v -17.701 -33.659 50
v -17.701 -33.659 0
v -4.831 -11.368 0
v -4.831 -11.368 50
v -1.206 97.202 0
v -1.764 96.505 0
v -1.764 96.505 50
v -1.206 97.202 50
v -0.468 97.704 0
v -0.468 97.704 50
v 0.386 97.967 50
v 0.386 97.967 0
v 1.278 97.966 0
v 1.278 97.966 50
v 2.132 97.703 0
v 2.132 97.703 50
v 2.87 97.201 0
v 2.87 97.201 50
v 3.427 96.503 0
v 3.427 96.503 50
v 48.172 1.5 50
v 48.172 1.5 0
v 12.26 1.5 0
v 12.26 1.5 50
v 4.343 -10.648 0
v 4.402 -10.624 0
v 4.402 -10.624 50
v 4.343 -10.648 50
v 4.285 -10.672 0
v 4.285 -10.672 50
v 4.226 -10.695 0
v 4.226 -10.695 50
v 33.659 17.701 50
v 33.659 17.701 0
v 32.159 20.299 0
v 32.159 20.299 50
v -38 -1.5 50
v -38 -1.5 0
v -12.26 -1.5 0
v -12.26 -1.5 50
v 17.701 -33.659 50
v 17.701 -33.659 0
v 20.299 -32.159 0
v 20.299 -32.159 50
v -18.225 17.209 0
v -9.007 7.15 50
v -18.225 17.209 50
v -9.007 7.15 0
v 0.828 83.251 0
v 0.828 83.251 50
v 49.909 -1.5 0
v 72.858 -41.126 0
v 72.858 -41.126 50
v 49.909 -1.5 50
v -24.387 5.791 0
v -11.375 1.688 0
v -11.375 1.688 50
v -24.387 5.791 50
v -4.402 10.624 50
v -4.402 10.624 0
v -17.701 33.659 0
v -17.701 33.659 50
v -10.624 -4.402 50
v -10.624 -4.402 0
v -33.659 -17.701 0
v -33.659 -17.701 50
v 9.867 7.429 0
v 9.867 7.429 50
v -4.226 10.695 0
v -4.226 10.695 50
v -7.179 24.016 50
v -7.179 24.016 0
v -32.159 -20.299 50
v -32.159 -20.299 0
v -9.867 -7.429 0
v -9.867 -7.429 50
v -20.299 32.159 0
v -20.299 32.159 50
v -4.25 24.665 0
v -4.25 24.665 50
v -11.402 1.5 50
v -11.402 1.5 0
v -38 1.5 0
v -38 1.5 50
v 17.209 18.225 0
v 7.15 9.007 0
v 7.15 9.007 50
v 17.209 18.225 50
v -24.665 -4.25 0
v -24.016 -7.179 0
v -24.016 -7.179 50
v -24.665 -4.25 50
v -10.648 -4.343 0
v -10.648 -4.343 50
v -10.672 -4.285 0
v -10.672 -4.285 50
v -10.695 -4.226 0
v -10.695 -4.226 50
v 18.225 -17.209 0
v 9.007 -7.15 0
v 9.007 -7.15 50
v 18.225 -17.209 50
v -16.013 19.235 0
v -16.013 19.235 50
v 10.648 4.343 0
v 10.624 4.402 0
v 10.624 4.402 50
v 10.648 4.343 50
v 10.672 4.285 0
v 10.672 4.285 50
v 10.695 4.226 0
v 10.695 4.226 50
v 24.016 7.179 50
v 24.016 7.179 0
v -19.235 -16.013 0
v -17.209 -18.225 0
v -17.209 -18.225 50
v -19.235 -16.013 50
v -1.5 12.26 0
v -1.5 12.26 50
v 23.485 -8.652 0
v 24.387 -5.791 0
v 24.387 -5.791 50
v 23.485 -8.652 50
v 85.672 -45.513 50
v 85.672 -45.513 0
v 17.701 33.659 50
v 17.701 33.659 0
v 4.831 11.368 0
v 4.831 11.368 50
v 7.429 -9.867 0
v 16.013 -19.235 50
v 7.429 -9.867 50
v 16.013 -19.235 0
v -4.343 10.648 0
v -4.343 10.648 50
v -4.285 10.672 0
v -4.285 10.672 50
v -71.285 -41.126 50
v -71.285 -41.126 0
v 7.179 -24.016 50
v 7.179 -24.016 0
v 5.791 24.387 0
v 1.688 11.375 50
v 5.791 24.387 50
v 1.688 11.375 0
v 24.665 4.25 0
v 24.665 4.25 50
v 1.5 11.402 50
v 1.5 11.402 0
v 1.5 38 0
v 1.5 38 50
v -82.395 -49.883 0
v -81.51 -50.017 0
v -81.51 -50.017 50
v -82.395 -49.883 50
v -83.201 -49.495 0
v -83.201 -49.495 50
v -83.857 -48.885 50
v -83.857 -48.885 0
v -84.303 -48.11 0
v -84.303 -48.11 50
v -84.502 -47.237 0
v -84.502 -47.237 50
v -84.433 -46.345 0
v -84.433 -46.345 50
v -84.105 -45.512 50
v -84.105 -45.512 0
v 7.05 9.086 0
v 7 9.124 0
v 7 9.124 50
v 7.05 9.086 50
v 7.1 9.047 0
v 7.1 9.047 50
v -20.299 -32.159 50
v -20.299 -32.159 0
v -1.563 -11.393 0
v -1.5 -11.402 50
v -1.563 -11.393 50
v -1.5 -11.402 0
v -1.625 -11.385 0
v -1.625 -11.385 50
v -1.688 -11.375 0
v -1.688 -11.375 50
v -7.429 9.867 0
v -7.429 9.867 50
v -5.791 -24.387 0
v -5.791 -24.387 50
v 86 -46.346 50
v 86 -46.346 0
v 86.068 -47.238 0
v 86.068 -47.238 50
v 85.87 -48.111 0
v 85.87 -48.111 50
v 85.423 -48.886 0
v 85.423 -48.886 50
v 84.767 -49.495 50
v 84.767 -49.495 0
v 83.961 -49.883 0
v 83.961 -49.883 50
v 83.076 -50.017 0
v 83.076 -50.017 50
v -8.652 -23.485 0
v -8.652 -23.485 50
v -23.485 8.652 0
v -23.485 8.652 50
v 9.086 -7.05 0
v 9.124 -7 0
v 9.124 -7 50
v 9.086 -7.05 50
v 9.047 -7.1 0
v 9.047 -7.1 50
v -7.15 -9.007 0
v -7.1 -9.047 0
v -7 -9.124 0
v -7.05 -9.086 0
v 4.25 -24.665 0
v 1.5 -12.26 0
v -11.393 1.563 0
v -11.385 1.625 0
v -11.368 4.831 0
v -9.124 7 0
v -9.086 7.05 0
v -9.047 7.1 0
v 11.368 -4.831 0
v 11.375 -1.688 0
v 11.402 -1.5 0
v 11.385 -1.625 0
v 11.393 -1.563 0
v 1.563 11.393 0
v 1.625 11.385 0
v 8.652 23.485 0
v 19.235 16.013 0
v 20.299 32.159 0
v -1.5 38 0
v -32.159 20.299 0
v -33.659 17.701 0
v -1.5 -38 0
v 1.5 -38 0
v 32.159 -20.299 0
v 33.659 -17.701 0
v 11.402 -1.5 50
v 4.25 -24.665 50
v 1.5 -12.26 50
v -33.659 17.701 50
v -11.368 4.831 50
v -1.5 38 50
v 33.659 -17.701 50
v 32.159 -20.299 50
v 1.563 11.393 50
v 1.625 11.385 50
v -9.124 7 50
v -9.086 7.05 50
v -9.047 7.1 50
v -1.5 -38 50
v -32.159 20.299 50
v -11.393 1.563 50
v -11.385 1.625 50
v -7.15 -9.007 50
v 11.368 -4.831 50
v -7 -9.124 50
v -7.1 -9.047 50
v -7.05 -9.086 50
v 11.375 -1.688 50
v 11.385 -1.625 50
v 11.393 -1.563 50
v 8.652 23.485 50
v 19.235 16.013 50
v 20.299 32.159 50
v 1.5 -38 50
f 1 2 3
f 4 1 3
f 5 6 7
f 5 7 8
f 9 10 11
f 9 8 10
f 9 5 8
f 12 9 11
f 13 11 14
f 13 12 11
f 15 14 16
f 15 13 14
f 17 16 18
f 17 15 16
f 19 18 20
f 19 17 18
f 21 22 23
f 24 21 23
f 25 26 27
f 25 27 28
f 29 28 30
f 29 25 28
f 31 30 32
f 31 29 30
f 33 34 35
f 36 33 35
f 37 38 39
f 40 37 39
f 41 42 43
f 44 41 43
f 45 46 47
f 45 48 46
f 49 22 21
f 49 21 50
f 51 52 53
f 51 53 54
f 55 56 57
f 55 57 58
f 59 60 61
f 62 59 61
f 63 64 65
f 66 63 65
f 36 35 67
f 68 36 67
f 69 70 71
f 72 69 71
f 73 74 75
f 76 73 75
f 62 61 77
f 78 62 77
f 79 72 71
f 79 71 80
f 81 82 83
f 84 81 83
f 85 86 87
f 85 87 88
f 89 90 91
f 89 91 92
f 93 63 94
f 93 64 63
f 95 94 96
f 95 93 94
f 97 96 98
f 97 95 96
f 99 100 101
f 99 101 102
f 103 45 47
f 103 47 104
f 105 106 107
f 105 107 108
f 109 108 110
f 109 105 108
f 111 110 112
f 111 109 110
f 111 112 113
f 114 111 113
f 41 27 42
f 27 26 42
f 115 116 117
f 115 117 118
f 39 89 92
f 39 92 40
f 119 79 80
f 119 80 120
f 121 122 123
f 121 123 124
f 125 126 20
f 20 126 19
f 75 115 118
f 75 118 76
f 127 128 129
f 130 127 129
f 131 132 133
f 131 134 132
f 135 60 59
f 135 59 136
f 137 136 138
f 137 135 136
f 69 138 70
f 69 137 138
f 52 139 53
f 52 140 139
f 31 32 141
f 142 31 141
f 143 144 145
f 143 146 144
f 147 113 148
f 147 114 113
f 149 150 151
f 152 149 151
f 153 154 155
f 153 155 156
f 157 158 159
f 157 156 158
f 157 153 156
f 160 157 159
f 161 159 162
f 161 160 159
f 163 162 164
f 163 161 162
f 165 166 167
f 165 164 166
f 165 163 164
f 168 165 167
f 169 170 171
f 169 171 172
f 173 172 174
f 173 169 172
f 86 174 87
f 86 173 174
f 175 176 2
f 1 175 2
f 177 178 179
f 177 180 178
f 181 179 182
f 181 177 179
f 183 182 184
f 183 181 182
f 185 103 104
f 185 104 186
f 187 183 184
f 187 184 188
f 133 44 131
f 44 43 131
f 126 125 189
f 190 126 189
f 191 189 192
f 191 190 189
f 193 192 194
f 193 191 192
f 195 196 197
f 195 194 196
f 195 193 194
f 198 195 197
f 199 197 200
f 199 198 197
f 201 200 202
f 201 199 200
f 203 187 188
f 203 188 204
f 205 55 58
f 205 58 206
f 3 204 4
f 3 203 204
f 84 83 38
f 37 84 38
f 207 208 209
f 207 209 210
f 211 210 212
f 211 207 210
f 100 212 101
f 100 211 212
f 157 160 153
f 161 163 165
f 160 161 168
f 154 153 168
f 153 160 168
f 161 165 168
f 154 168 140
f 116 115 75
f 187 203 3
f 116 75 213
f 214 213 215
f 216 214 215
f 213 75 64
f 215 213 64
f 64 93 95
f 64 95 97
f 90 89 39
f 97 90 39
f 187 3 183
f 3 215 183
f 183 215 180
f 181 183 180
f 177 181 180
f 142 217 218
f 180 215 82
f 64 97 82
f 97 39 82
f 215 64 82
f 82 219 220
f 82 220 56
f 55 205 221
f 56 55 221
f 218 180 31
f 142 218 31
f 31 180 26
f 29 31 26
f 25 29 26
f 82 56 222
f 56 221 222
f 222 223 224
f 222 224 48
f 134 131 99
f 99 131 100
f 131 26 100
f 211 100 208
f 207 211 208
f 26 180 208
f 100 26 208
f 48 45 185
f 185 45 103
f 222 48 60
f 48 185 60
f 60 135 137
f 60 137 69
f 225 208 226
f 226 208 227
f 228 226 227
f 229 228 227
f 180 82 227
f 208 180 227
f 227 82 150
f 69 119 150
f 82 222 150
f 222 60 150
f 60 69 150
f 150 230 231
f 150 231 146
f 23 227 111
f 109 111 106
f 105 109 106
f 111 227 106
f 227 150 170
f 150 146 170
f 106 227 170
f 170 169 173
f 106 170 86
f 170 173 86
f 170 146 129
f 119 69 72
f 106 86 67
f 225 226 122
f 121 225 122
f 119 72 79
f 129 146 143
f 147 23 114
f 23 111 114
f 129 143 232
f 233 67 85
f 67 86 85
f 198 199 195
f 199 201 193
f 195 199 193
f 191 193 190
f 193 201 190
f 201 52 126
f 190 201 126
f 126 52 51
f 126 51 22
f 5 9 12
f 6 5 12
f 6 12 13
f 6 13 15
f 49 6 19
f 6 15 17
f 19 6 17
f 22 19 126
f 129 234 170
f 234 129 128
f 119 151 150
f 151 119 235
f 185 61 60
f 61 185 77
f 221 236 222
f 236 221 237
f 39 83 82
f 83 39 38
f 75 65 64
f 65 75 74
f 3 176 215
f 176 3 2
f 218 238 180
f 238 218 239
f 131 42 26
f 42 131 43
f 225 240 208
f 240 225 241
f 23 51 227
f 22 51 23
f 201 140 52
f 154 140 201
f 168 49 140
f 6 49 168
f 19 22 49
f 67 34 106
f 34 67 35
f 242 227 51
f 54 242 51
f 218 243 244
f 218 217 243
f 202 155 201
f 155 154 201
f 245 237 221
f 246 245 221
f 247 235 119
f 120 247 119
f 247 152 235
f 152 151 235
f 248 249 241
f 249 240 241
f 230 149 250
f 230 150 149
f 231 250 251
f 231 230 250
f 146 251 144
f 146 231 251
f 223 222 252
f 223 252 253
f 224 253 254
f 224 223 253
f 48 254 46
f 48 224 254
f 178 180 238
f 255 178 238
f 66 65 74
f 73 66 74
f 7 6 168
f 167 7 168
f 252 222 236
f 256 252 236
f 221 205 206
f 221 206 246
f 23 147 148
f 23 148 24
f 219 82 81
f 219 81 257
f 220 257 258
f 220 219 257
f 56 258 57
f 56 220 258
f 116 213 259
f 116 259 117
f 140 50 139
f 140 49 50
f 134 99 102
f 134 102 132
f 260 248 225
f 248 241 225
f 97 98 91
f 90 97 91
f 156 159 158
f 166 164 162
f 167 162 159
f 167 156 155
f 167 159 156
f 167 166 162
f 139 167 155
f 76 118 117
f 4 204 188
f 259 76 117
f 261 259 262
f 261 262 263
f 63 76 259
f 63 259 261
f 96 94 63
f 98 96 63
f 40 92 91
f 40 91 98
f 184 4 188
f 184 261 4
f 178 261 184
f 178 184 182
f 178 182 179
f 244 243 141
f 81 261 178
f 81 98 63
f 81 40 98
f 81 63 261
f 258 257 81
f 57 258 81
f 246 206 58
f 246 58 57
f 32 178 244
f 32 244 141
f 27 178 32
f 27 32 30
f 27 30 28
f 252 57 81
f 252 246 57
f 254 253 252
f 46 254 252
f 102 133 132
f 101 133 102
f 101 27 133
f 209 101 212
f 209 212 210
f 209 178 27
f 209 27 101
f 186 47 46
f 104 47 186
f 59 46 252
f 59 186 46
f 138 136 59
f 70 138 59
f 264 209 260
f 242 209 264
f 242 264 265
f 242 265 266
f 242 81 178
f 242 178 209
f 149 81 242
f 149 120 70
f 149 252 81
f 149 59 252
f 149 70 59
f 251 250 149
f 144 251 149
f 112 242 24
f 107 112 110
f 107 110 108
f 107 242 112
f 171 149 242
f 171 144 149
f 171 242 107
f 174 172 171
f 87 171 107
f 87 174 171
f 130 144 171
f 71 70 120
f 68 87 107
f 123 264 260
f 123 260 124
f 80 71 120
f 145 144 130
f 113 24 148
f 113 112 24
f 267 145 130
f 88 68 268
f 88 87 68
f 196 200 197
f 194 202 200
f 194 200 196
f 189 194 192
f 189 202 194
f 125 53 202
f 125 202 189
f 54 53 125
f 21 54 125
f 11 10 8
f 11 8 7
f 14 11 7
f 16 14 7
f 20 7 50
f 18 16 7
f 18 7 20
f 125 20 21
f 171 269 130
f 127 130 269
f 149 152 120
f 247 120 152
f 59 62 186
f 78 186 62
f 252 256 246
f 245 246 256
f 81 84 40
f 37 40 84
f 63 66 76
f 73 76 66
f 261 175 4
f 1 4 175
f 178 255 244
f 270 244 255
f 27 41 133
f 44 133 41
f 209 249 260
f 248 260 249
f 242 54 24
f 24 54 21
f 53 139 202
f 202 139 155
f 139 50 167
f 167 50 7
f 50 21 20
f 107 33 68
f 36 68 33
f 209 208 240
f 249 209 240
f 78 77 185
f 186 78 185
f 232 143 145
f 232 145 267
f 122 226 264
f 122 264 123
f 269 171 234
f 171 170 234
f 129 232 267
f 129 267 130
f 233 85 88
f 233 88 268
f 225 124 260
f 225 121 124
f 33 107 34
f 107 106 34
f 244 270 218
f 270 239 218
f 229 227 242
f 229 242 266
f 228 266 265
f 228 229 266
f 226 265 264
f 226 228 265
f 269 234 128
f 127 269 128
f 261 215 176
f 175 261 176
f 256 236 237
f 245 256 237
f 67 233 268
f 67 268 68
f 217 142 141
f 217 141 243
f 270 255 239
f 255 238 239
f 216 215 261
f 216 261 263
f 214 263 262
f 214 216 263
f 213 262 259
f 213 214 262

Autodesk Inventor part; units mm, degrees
ref_plane "YZ Plane" through (0, 0, 0) normal (1, 0, 0) x (0, 1, 0)
ref_plane "XZ Plane" through (0, 0, 0) normal (0, 1, 0) x (-1, 0, 0)
ref_plane "XY Plane" through (0, 0, 0) normal (0, 0, 1) x (1, 0, 0)
sketch "Esquisse3" plane through (0, 0, 0) normal (0, 0, 1) x (1, 0, 0)
  line L0 (-97.75, 106.7859) -> (105.7088, 106.7859) construction
  line L1 (105.7088, 106.7859) -> (105.7088, -86.5) construction
  line L2 (105.7088, -86.5) -> (-97.75, -86.5) construction
  line L3 (-97.75, -86.5) -> (-97.75, 106.7859) construction
  circle A0 centre (0, 0) radius 11.5
  line L4 (-1.5, 0) -> (1.5, 0)
  line L5 (1.5, 0) -> (1.5, 38)
  line L6 (1.5, 38) -> (-1.5, 38)
  line L7 (-1.5, 38) -> (-1.5, 0)
  circle A1 centre (0, 0) radius 11.5 construction
  line L8 (-1.299, -0.75) -> (1.299, 0.75)
  line L9 (1.299, 0.75) -> (-17.701, 33.659)
  line L10 (-17.701, 33.659) -> (-20.299, 32.159)
  line L11 (-20.299, 32.159) -> (-1.299, -0.75)
  circle A2 centre (0, 0) radius 11.5 construction
  line L12 (-0.75, -1.299) -> (0.75, 1.299)
  line L13 (0.75, 1.299) -> (-32.159, 20.299)
  line L14 (-32.159, 20.299) -> (-33.659, 17.701)
  line L15 (-33.659, 17.701) -> (-0.75, -1.299)
  circle A3 centre (0, 0) radius 11.5 construction
  line L16 (0, -1.5) -> (0, 1.5)
  line L17 (0, 1.5) -> (-38, 1.5)
  line L18 (-38, 1.5) -> (-38, -1.5)
  line L19 (-38, -1.5) -> (0, -1.5)
  line L20 (-17.701, -33.659) -> (1.299, -0.75)
  line L21 (-0.75, -1.299) -> (0.75, 1.299)
  line L22 (-1.299, 0.75) -> (-20.299, -32.159)
  line L23 (-33.659, -17.701) -> (-32.159, -20.299)
  line L24 (-0.75, 1.299) -> (-33.659, -17.701)
  line L25 (-38, 1.5) -> (-38, -1.5)
  line L26 (0, 1.5) -> (-38, 1.5)
  line L27 (-33.659, 17.701) -> (-0.75, -1.299)
  line L28 (0.75, 1.299) -> (-32.159, 20.299)
  line L29 (-32.159, 20.299) -> (-33.659, 17.701)
  line L30 (-20.299, -32.159) -> (-17.701, -33.659)
  line L31 (-38, -1.5) -> (0, -1.5)
  line L32 (-32.159, -20.299) -> (0.75, -1.299)
  line L33 (1.299, -0.75) -> (-1.299, 0.75)
  line L34 (0.75, -1.299) -> (-0.75, 1.299)
  line L35 (0, -1.5) -> (0, 1.5)
  line L36 (20.299, -32.159) -> (1.299, 0.75)
  line L37 (0.75, -1.299) -> (-0.75, 1.299)
  line L38 (-1.299, -0.75) -> (17.701, -33.659)
  line L39 (-1.5, -38) -> (1.5, -38)
  line L40 (-1.5, 0) -> (-1.5, -38)
  line L41 (-20.299, -32.159) -> (-17.701, -33.659)
  line L42 (-1.299, 0.75) -> (-20.299, -32.159)
  line L43 (-32.159, -20.299) -> (0.75, -1.299)
  line L44 (-0.75, 1.299) -> (-33.659, -17.701)
  line L45 (-33.659, -17.701) -> (-32.159, -20.299)
  line L46 (17.701, -33.659) -> (20.299, -32.159)
  line L47 (-17.701, -33.659) -> (1.299, -0.75)
  line L48 (1.5, -38) -> (1.5, 0)
  line L49 (1.299, 0.75) -> (-1.299, -0.75)
  line L50 (1.5, 0) -> (-1.5, 0)
  line L51 (1.299, -0.75) -> (-1.299, 0.75)
  line L52 (38, 1.5) -> (0, 1.5)
  line L53 (1.5, 0) -> (-1.5, 0)
  line L54 (0, -1.5) -> (38, -1.5)
  line L55 (32.159, -20.299) -> (33.659, -17.701)
  line L56 (-0.75, -1.299) -> (32.159, -20.299)
  line L57 (17.701, -33.659) -> (20.299, -32.159)
  line L58 (-1.299, -0.75) -> (17.701, -33.659)
  line L59 (1.5, -38) -> (1.5, 0)
  line L60 (-1.5, 0) -> (-1.5, -38)
  line L61 (-1.5, -38) -> (1.5, -38)
  line L62 (38, -1.5) -> (38, 1.5)
  line L63 (20.299, -32.159) -> (1.299, 0.75)
  line L64 (33.659, -17.701) -> (0.75, 1.299)
  line L65 (0, 1.5) -> (0, -1.5)
  line L66 (0.75, 1.299) -> (-0.75, -1.299)
  line L67 (1.299, 0.75) -> (-1.299, -0.75)
  line L68 (17.701, 33.659) -> (-1.299, 0.75)
  line L69 (0.75, 1.299) -> (-0.75, -1.299)
  line L70 (1.299, -0.75) -> (20.299, 32.159)
  line L71 (33.659, 17.701) -> (32.159, 20.299)
  line L72 (0.75, -1.299) -> (33.659, 17.701)
  line L73 (38, -1.5) -> (38, 1.5)
  line L74 (0, -1.5) -> (38, -1.5)
  line L75 (33.659, -17.701) -> (0.75, 1.299)
  line L76 (-0.75, -1.299) -> (32.159, -20.299)
  line L77 (32.159, -20.299) -> (33.659, -17.701)
  line L78 (20.299, 32.159) -> (17.701, 33.659)
  line L79 (38, 1.5) -> (0, 1.5)
  line L80 (32.159, 20.299) -> (-0.75, 1.299)
  line L81 (-1.299, 0.75) -> (1.299, -0.75)
  line L82 (-0.75, 1.299) -> (0.75, -1.299)
  line L83 (0, 1.5) -> (0, -1.5)
  line L84 (-20.299, 32.159) -> (-1.299, -0.75)
  line L85 (-0.75, 1.299) -> (0.75, -1.299)
  line L86 (1.299, 0.75) -> (-17.701, 33.659)
  line L87 (1.5, 38) -> (-1.5, 38)
  line L88 (1.5, 0) -> (1.5, 38)
  line L89 (20.299, 32.159) -> (17.701, 33.659)
  line L90 (1.299, -0.75) -> (20.299, 32.159)
  line L91 (32.159, 20.299) -> (-0.75, 1.299)
  line L92 (0.75, -1.299) -> (33.659, 17.701)
  line L93 (33.659, 17.701) -> (32.159, 20.299)
  line L94 (-17.701, 33.659) -> (-20.299, 32.159)
  line L95 (17.701, 33.659) -> (-1.299, 0.75)
  line L96 (-1.5, 38) -> (-1.5, 0)
  line L97 (-1.299, -0.75) -> (1.299, 0.75)
  line L98 (-1.5, 0) -> (1.5, 0)
  line L99 (-1.299, 0.75) -> (1.299, -0.75)
  line L100 (-3.6093, 7.914) -> (-7.1789, 24.0155)
  line L101 (-7.1789, 24.0155) -> (-4.25, 24.6648)
  line L102 (-4.25, 24.6648) -> (-0.6804, 8.5633)
  line L103 (-0.6804, 8.5633) -> (-3.6093, 7.914)
  line L104 (-3.6093, 7.914) -> (-4.25, 24.6648) construction
  line L105 (-7.1789, 24.0155) -> (-0.6804, 8.5633) construction
  line L106 (-4.8709, 7.0758) -> (-7.0827, 5.0491)
  line L107 (-16.013, 19.2353) -> (-4.8709, 7.0758)
  line L108 (-7.0827, 5.0491) -> (-18.2248, 17.2086)
  line L109 (-7.7562, 3.6924) -> (-8.6583, 0.8313)
  line L110 (-23.4853, 8.6518) -> (-7.7562, 3.6924)
  line L111 (-8.6583, 0.8313) -> (-24.3874, 5.7906)
  line L112 (-8.5633, -0.6804) -> (-7.914, -3.6093)
  line L113 (-24.6648, -4.25) -> (-8.5633, -0.6804)
  line L114 (-7.914, -3.6093) -> (-24.0155, -7.1789)
  line L115 (-18.2248, 17.2086) -> (-16.013, 19.2353)
  line L116 (-24.3874, 5.7906) -> (-23.4853, 8.6518)
  line L117 (-24.0155, -7.1789) -> (-24.6648, -4.25)
  line L118 (-0.8313, -8.6583) -> (-5.7906, -24.3874)
  line L119 (-8.6518, -23.4853) -> (-3.6924, -7.7562)
  line L120 (-5.7906, -24.3874) -> (-8.6518, -23.4853)
  line L121 (-3.6924, -7.7562) -> (-0.8313, -8.6583)
  line L122 (-17.2086, -18.2248) -> (-19.2353, -16.013)
  line L123 (-5.0491, -7.0827) -> (-17.2086, -18.2248)
  line L124 (-19.2353, -16.013) -> (-7.0758, -4.8709)
  line L125 (-7.914, -3.6093) -> (-24.0155, -7.1789)
  line L126 (-24.0155, -7.1789) -> (-24.6648, -4.25)
  line L127 (-24.6648, -4.25) -> (-8.5633, -0.6804)
  line L128 (-7.0758, -4.8709) -> (-5.0491, -7.0827)
  line L129 (-7.7562, 3.6924) -> (-8.6583, 0.8313)
  line L130 (-8.6583, 0.8313) -> (-24.3874, 5.7906)
  line L131 (-23.4853, 8.6518) -> (-7.7562, 3.6924)
  line L132 (-8.5633, -0.6804) -> (-7.914, -3.6093)
  line L133 (-24.3874, 5.7906) -> (-23.4853, 8.6518)
  line L134 (7.0827, -5.0491) -> (18.2248, -17.2086)
  line L135 (16.013, -19.2353) -> (4.8709, -7.0758)
  line L136 (18.2248, -17.2086) -> (16.013, -19.2353)
  line L137 (4.8709, -7.0758) -> (7.0827, -5.0491)
  line L138 (7.1789, -24.0155) -> (4.25, -24.6648)
  line L139 (3.6093, -7.914) -> (7.1789, -24.0155)
  line L140 (4.25, -24.6648) -> (0.6804, -8.5633)
  line L141 (-0.8313, -8.6583) -> (-5.7906, -24.3874)
  line L142 (-5.7906, -24.3874) -> (-8.6518, -23.4853)
  line L143 (-8.6518, -23.4853) -> (-3.6924, -7.7562)
  line L144 (0.6804, -8.5633) -> (3.6093, -7.914)
  line L145 (-7.0758, -4.8709) -> (-5.0491, -7.0827)
  line L146 (-5.0491, -7.0827) -> (-17.2086, -18.2248)
  line L147 (-19.2353, -16.013) -> (-7.0758, -4.8709)
  line L148 (-3.6924, -7.7562) -> (-0.8313, -8.6583)
  line L149 (-17.2086, -18.2248) -> (-19.2353, -16.013)
  line L150 (7.914, 3.6093) -> (24.0155, 7.1789)
  line L151 (24.6648, 4.25) -> (8.5633, 0.6804)
  line L152 (24.0155, 7.1789) -> (24.6648, 4.25)
  line L153 (8.5633, 0.6804) -> (7.914, 3.6093)
  line L154 (24.3874, -5.7906) -> (23.4853, -8.6518)
  line L155 (8.6583, -0.8313) -> (24.3874, -5.7906)
  line L156 (23.4853, -8.6518) -> (7.7562, -3.6924)
  line L157 (7.0827, -5.0491) -> (18.2248, -17.2086)
  line L158 (18.2248, -17.2086) -> (16.013, -19.2353)
  line L159 (16.013, -19.2353) -> (4.8709, -7.0758)
  line L160 (7.7562, -3.6924) -> (8.6583, -0.8313)
  line L161 (0.6804, -8.5633) -> (3.6093, -7.914)
  line L162 (3.6093, -7.914) -> (7.1789, -24.0155)
  line L163 (4.25, -24.6648) -> (0.6804, -8.5633)
  line L164 (4.8709, -7.0758) -> (7.0827, -5.0491)
  line L165 (7.1789, -24.0155) -> (4.25, -24.6648)
  line L166 (0.8313, 8.6583) -> (5.7906, 24.3874)
  line L167 (8.6518, 23.4853) -> (3.6924, 7.7562)
  line L168 (5.7906, 24.3874) -> (8.6518, 23.4853)
  line L169 (3.6924, 7.7562) -> (0.8313, 8.6583)
  line L170 (17.2086, 18.2248) -> (19.2353, 16.013)
  line L171 (5.0491, 7.0827) -> (17.2086, 18.2248)
  line L172 (19.2353, 16.013) -> (7.0758, 4.8709)
  line L173 (7.914, 3.6093) -> (24.0155, 7.1789)
  line L174 (24.0155, 7.1789) -> (24.6648, 4.25)
  line L175 (24.6648, 4.25) -> (8.5633, 0.6804)
  line L176 (7.0758, 4.8709) -> (5.0491, 7.0827)
  line L177 (7.7562, -3.6924) -> (8.6583, -0.8313)
  line L178 (8.6583, -0.8313) -> (24.3874, -5.7906)
  line L179 (23.4853, -8.6518) -> (7.7562, -3.6924)
  line L180 (8.5633, 0.6804) -> (7.914, 3.6093)
  line L181 (24.3874, -5.7906) -> (23.4853, -8.6518)
  line L182 (-7.0827, 5.0491) -> (-18.2248, 17.2086)
  line L183 (-16.013, 19.2353) -> (-4.8709, 7.0758)
  line L184 (-18.2248, 17.2086) -> (-16.013, 19.2353)
  line L185 (-4.8709, 7.0758) -> (-7.0827, 5.0491)
  line L186 (-7.1789, 24.0155) -> (-4.25, 24.6648)
  line L187 (-3.6093, 7.914) -> (-7.1789, 24.0155)
  line L188 (-4.25, 24.6648) -> (-0.6804, 8.5633)
  line L189 (0.8313, 8.6583) -> (5.7906, 24.3874)
  line L190 (5.7906, 24.3874) -> (8.6518, 23.4853)
  line L191 (8.6518, 23.4853) -> (3.6924, 7.7562)
  line L192 (-0.6804, 8.5633) -> (-3.6093, 7.914)
  line L193 (7.0758, 4.8709) -> (5.0491, 7.0827)
  line L194 (5.0491, 7.0827) -> (17.2086, 18.2248)
  line L195 (19.2353, 16.013) -> (7.0758, 4.8709)
  line L196 (3.6924, 7.7562) -> (0.8313, 8.6583)
  line L197 (17.2086, 18.2248) -> (19.2353, 16.013)
  line L198 (-71.285, -41.126) -> (72.8576, -41.126)
  line L199 (72.8576, -41.126) -> (0.8283, 83.2506)
  line L200 (0.8283, 83.2506) -> (-71.285, -41.126)
  line L201 (-81.5097, -50.0167) -> (83.0763, -50.0167)
  line L202 (85.6724, -45.5133) -> (3.4273, 96.5034)
  line L203 (-1.7641, 96.5048) -> (-84.105, -45.512)
  arc A4 (-84.105, -45.512) -> (-81.5097, -50.0167) centre (-81.5097, -47.0167) ccw
  arc A5 (83.0763, -50.0167) -> (85.6724, -45.5133) centre (83.0763, -47.0167) ccw
  arc A6 (3.4273, 96.5034) -> (-1.7641, 96.5048) centre (0.8313, 95) ccw
  line L204 (34.3249, -1.5) -> (55, -1.5)
  line L205 (55, -1.5) -> (55, 1.5)
  line L206 (55, 1.5) -> (34.3249, 1.5)
  line L207 (34.3249, 1.5) -> (34.3249, -1.5)
  point P0 (0, 38)
  point P1 (-19, 32.909)
  point P2 (-32.909, 19)
  point P3 (-38, 0)
  point P4 (-32.909, -19)
  point P5 (-38, 0)
  point P6 (-32.909, 19)
  point P7 (-141.3543, -31.2611)
  point P8 (-19, -32.909)
  point P9 (0, -38)
  point P10 (-19, -32.909)
  point P11 (-32.909, -19)
  point P12 (-43.6043, -138.0469)
  point P13 (19, -32.909)
  point P14 (32.909, -19)
  point P15 (19, -32.909)
  point P16 (0, -38)
  point P17 (97.75, -106.7859)
  point P18 (38, 0)
  point P19 (32.909, 19)
  point P20 (38, 0)
  point P21 (32.909, -19)
  point P22 (141.3543, 31.2611)
  point P23 (19, 32.909)
  point P24 (0, 38)
  point P25 (19, 32.909)
  point P26 (32.909, 19)
  point P27 (43.6043, 138.0469)
  point P28 (-19, 32.909)
  point P29 (-3.9296, 16.2894)
  dimension "d116" = 203.4588
  dimension "d120" = 193.2859
  dimension "d121" = 97.75
  dimension "d122" = 86.5
  dimension "d124" = 23
  dimension "d125" = 3
  dimension "d128" = 38
  dimension "d133" = 90
  dimension "d138" = 360
  dimension "d143" = 3
  dimension "d155" = 25
  dimension "d157" = 12.5
  dimension "d162" = 2.75
  dimension "d165" = 90
  dimension "d170" = 360
  dimension "d179" = 3
extrude "Extrusion3" add sketch "Esquisse3" along normal blind 50 contours A0 L54 L155 L160 L64 L72 L52 L153 L151 | A0 L151 L52 L207 L54 | L151 L153 L52 A0 | A0 L52 L151 | A0 L155 L54 | L52 L153 L72 L150 A0 | A0 L150 L152 L151 L52 | L155 L154 L156 L64 A0 | A0 L64 L160 L54 L155 | L54 L160 L155 | L207 L52 L62 L54 | L150 L72 A0 | L52 L72 L153 | L64 L156 A0 | A0 L156 L160 L64 | L160 L64 L54 | L62 L206 L199 L204 | L72 L150 L153 L52 L70 L80 L176 L172 A0 | A0 L172 L80 L71 L72 | L72 L153 L150 | L72 L64 L70 L52 | L156 L64 L55 L56 A0 | A0 L56 L134 L137 L36 L54 L64 L160 L156 | L54 L36 L72 L64 | L199 L206 L205 L204 | L172 L176 L80 A0 | A0 L80 L172 | L70 L64 L5 L52 | L52 L5 L80 L70 | L72 L36 L70 L64 | A0 L134 L56 | L54 L48 L72 L36 | L36 L56 L48 L54 | L80 L176 L70 L171 A0 | A0 L171 L170 L172 L80 | L52 L9 L80 L5 | L5 L64 L9 L52 | L70 L36 L5 L64 | L80 L5 L68 L169 L167 A0 L70 L171 L176 | L70 L176 L80 | L72 L48 L70 L36 | L134 L136 L135 L36 A0 | A0 L36 L137 L56 L134 | L56 L137 L134 | L56 L137 L36 | L36 L137 L135 A0 L38 L139 L144 L48 L56 | L54 L20 L72 L48 | L48 L56 L20 L54 | L171 L70 A0 | L5 L36 L9 L64 | L80 L9 L68 L5 | L52 L13 L80 L9 | L9 L64 L13 L52 | L70 L48 L5 L36 | L176 L171 L70 | L72 L20 L70 L48 | L36 L135 A0 | A0 L135 L137 L36 | L48 L38 L20 L56 | L54 L32 L72 L20 | L20 L56 L32 L54 | A0 L167 L68 L78 L70 | L5 L4 L8 L36 | L9 L8 L12 L64 | L68 L9 L7 L103 L102 A0 L5 L166 L169 | L5 L169 L68 | L80 L13 L68 L9 | L52 L17 L80 L13 | L13 L12 L16 L52 | L70 L33 L4 L48 | L72 L34 L33 L20 | L135 L36 L46 L38 A0 | L48 L144 L140 A0 L40 L118 L121 L20 L38 | L38 L144 L48 | L20 L38 L32 L56 | L54 L16 L34 L32 | L32 L56 L19 L54 | L167 L169 L68 A0 | A0 L68 L167 | L169 L166 L5 | L5 L166 A0 L68 L169 | L68 L13 L7 L9 | L80 L17 L68 L13 | L16 L34 L80 L17 | A0 L139 L38 | L20 L40 L32 L38 | L144 L139 L38 | L38 L139 A0 L48 L144 | L48 A0 L140 L144 | L32 L38 L19 L56 | L19 L56 L12 L16 | A0 L166 L168 L167 L68 | L8 L11 L40 L4 | L12 L15 L38 L8 | L4 L7 L22 L33 | L33 L68 L24 L34 | L5 A0 L166 | L9 L103 L7 | L7 L13 L11 L106 L107 A0 L9 L100 L103 | L68 L17 L7 L13 | L80 L24 L68 L17 | L139 L138 L140 L48 A0 | L40 L121 L20 | L20 L121 L119 A0 L22 L123 L128 L32 L40 | L32 L40 L19 L38 | L48 L140 A0 | L19 L38 L15 L56 | L40 L11 L22 L7 | L38 L15 L40 L11 | L22 L7 L24 L68 | A0 L102 L7 L6 L5 | L103 L9 L100 A0 L7 | L7 A0 L102 L103 | L7 L17 L11 L13 | L103 L100 L9 | L68 L24 L7 L17 | L121 L40 L118 A0 L20 | L20 A0 L119 L121 | L32 L22 L19 L40 | L121 L118 L40 | L19 L40 L15 L38 | L140 L48 L39 L40 A0 | L22 L11 L24 L7 | L40 L15 L22 L11 | A0 L7 L102 | A0 L100 L101 L102 L7 | L7 L24 L11 L17 | L13 L106 L11 | L11 L17 L15 L109 L110 A0 L13 L108 L106 | L9 A0 L100 | L20 L119 A0 | A0 L118 L120 L119 L20 | L32 L128 L124 A0 L24 L114 L112 L19 L22 | L22 L128 L32 | L19 L22 L15 L40 | L40 A0 L118 | L22 L15 L24 L11 | L11 L24 L15 L17 | L106 L13 L108 A0 L11 | L11 A0 L107 L106 | L106 L108 L13 | A0 L107 L11 L10 L9 | L119 L20 L30 L22 A0 | L19 L24 L15 L22 | L128 L123 L22 | L22 L123 A0 L32 L128 | L32 A0 L124 L128 | L17 L109 L15 | L15 L24 L19 L112 L113 A0 L17 L111 L109 | L11 L107 A0 | A0 L108 L115 L107 L11 | L13 A0 L108 | A0 L123 L22 | L24 L112 L19 | L32 L124 A0 | A0 L123 L122 L124 L32 | L109 L17 L111 A0 L15 | L15 A0 L110 L109 | L109 L111 L17 | A0 L110 L15 L14 L13 | L112 L24 L114 A0 L19 | L19 A0 L113 L112 | L112 L114 L24 | L124 L32 L23 L24 A0 | L15 L110 A0 | A0 L111 L116 L110 L15 | L17 A0 L111 | L19 L113 A0 | A0 L114 L117 L113 L19 | L24 A0 L114 | A0 L113 L19 L18 L17 | A4 L203 A6 L202 A5 L201
equation "\"pi\" = 3.141593"
equation "\"nombredor\" = 1.61803"
properties part number "Logo Laser"
